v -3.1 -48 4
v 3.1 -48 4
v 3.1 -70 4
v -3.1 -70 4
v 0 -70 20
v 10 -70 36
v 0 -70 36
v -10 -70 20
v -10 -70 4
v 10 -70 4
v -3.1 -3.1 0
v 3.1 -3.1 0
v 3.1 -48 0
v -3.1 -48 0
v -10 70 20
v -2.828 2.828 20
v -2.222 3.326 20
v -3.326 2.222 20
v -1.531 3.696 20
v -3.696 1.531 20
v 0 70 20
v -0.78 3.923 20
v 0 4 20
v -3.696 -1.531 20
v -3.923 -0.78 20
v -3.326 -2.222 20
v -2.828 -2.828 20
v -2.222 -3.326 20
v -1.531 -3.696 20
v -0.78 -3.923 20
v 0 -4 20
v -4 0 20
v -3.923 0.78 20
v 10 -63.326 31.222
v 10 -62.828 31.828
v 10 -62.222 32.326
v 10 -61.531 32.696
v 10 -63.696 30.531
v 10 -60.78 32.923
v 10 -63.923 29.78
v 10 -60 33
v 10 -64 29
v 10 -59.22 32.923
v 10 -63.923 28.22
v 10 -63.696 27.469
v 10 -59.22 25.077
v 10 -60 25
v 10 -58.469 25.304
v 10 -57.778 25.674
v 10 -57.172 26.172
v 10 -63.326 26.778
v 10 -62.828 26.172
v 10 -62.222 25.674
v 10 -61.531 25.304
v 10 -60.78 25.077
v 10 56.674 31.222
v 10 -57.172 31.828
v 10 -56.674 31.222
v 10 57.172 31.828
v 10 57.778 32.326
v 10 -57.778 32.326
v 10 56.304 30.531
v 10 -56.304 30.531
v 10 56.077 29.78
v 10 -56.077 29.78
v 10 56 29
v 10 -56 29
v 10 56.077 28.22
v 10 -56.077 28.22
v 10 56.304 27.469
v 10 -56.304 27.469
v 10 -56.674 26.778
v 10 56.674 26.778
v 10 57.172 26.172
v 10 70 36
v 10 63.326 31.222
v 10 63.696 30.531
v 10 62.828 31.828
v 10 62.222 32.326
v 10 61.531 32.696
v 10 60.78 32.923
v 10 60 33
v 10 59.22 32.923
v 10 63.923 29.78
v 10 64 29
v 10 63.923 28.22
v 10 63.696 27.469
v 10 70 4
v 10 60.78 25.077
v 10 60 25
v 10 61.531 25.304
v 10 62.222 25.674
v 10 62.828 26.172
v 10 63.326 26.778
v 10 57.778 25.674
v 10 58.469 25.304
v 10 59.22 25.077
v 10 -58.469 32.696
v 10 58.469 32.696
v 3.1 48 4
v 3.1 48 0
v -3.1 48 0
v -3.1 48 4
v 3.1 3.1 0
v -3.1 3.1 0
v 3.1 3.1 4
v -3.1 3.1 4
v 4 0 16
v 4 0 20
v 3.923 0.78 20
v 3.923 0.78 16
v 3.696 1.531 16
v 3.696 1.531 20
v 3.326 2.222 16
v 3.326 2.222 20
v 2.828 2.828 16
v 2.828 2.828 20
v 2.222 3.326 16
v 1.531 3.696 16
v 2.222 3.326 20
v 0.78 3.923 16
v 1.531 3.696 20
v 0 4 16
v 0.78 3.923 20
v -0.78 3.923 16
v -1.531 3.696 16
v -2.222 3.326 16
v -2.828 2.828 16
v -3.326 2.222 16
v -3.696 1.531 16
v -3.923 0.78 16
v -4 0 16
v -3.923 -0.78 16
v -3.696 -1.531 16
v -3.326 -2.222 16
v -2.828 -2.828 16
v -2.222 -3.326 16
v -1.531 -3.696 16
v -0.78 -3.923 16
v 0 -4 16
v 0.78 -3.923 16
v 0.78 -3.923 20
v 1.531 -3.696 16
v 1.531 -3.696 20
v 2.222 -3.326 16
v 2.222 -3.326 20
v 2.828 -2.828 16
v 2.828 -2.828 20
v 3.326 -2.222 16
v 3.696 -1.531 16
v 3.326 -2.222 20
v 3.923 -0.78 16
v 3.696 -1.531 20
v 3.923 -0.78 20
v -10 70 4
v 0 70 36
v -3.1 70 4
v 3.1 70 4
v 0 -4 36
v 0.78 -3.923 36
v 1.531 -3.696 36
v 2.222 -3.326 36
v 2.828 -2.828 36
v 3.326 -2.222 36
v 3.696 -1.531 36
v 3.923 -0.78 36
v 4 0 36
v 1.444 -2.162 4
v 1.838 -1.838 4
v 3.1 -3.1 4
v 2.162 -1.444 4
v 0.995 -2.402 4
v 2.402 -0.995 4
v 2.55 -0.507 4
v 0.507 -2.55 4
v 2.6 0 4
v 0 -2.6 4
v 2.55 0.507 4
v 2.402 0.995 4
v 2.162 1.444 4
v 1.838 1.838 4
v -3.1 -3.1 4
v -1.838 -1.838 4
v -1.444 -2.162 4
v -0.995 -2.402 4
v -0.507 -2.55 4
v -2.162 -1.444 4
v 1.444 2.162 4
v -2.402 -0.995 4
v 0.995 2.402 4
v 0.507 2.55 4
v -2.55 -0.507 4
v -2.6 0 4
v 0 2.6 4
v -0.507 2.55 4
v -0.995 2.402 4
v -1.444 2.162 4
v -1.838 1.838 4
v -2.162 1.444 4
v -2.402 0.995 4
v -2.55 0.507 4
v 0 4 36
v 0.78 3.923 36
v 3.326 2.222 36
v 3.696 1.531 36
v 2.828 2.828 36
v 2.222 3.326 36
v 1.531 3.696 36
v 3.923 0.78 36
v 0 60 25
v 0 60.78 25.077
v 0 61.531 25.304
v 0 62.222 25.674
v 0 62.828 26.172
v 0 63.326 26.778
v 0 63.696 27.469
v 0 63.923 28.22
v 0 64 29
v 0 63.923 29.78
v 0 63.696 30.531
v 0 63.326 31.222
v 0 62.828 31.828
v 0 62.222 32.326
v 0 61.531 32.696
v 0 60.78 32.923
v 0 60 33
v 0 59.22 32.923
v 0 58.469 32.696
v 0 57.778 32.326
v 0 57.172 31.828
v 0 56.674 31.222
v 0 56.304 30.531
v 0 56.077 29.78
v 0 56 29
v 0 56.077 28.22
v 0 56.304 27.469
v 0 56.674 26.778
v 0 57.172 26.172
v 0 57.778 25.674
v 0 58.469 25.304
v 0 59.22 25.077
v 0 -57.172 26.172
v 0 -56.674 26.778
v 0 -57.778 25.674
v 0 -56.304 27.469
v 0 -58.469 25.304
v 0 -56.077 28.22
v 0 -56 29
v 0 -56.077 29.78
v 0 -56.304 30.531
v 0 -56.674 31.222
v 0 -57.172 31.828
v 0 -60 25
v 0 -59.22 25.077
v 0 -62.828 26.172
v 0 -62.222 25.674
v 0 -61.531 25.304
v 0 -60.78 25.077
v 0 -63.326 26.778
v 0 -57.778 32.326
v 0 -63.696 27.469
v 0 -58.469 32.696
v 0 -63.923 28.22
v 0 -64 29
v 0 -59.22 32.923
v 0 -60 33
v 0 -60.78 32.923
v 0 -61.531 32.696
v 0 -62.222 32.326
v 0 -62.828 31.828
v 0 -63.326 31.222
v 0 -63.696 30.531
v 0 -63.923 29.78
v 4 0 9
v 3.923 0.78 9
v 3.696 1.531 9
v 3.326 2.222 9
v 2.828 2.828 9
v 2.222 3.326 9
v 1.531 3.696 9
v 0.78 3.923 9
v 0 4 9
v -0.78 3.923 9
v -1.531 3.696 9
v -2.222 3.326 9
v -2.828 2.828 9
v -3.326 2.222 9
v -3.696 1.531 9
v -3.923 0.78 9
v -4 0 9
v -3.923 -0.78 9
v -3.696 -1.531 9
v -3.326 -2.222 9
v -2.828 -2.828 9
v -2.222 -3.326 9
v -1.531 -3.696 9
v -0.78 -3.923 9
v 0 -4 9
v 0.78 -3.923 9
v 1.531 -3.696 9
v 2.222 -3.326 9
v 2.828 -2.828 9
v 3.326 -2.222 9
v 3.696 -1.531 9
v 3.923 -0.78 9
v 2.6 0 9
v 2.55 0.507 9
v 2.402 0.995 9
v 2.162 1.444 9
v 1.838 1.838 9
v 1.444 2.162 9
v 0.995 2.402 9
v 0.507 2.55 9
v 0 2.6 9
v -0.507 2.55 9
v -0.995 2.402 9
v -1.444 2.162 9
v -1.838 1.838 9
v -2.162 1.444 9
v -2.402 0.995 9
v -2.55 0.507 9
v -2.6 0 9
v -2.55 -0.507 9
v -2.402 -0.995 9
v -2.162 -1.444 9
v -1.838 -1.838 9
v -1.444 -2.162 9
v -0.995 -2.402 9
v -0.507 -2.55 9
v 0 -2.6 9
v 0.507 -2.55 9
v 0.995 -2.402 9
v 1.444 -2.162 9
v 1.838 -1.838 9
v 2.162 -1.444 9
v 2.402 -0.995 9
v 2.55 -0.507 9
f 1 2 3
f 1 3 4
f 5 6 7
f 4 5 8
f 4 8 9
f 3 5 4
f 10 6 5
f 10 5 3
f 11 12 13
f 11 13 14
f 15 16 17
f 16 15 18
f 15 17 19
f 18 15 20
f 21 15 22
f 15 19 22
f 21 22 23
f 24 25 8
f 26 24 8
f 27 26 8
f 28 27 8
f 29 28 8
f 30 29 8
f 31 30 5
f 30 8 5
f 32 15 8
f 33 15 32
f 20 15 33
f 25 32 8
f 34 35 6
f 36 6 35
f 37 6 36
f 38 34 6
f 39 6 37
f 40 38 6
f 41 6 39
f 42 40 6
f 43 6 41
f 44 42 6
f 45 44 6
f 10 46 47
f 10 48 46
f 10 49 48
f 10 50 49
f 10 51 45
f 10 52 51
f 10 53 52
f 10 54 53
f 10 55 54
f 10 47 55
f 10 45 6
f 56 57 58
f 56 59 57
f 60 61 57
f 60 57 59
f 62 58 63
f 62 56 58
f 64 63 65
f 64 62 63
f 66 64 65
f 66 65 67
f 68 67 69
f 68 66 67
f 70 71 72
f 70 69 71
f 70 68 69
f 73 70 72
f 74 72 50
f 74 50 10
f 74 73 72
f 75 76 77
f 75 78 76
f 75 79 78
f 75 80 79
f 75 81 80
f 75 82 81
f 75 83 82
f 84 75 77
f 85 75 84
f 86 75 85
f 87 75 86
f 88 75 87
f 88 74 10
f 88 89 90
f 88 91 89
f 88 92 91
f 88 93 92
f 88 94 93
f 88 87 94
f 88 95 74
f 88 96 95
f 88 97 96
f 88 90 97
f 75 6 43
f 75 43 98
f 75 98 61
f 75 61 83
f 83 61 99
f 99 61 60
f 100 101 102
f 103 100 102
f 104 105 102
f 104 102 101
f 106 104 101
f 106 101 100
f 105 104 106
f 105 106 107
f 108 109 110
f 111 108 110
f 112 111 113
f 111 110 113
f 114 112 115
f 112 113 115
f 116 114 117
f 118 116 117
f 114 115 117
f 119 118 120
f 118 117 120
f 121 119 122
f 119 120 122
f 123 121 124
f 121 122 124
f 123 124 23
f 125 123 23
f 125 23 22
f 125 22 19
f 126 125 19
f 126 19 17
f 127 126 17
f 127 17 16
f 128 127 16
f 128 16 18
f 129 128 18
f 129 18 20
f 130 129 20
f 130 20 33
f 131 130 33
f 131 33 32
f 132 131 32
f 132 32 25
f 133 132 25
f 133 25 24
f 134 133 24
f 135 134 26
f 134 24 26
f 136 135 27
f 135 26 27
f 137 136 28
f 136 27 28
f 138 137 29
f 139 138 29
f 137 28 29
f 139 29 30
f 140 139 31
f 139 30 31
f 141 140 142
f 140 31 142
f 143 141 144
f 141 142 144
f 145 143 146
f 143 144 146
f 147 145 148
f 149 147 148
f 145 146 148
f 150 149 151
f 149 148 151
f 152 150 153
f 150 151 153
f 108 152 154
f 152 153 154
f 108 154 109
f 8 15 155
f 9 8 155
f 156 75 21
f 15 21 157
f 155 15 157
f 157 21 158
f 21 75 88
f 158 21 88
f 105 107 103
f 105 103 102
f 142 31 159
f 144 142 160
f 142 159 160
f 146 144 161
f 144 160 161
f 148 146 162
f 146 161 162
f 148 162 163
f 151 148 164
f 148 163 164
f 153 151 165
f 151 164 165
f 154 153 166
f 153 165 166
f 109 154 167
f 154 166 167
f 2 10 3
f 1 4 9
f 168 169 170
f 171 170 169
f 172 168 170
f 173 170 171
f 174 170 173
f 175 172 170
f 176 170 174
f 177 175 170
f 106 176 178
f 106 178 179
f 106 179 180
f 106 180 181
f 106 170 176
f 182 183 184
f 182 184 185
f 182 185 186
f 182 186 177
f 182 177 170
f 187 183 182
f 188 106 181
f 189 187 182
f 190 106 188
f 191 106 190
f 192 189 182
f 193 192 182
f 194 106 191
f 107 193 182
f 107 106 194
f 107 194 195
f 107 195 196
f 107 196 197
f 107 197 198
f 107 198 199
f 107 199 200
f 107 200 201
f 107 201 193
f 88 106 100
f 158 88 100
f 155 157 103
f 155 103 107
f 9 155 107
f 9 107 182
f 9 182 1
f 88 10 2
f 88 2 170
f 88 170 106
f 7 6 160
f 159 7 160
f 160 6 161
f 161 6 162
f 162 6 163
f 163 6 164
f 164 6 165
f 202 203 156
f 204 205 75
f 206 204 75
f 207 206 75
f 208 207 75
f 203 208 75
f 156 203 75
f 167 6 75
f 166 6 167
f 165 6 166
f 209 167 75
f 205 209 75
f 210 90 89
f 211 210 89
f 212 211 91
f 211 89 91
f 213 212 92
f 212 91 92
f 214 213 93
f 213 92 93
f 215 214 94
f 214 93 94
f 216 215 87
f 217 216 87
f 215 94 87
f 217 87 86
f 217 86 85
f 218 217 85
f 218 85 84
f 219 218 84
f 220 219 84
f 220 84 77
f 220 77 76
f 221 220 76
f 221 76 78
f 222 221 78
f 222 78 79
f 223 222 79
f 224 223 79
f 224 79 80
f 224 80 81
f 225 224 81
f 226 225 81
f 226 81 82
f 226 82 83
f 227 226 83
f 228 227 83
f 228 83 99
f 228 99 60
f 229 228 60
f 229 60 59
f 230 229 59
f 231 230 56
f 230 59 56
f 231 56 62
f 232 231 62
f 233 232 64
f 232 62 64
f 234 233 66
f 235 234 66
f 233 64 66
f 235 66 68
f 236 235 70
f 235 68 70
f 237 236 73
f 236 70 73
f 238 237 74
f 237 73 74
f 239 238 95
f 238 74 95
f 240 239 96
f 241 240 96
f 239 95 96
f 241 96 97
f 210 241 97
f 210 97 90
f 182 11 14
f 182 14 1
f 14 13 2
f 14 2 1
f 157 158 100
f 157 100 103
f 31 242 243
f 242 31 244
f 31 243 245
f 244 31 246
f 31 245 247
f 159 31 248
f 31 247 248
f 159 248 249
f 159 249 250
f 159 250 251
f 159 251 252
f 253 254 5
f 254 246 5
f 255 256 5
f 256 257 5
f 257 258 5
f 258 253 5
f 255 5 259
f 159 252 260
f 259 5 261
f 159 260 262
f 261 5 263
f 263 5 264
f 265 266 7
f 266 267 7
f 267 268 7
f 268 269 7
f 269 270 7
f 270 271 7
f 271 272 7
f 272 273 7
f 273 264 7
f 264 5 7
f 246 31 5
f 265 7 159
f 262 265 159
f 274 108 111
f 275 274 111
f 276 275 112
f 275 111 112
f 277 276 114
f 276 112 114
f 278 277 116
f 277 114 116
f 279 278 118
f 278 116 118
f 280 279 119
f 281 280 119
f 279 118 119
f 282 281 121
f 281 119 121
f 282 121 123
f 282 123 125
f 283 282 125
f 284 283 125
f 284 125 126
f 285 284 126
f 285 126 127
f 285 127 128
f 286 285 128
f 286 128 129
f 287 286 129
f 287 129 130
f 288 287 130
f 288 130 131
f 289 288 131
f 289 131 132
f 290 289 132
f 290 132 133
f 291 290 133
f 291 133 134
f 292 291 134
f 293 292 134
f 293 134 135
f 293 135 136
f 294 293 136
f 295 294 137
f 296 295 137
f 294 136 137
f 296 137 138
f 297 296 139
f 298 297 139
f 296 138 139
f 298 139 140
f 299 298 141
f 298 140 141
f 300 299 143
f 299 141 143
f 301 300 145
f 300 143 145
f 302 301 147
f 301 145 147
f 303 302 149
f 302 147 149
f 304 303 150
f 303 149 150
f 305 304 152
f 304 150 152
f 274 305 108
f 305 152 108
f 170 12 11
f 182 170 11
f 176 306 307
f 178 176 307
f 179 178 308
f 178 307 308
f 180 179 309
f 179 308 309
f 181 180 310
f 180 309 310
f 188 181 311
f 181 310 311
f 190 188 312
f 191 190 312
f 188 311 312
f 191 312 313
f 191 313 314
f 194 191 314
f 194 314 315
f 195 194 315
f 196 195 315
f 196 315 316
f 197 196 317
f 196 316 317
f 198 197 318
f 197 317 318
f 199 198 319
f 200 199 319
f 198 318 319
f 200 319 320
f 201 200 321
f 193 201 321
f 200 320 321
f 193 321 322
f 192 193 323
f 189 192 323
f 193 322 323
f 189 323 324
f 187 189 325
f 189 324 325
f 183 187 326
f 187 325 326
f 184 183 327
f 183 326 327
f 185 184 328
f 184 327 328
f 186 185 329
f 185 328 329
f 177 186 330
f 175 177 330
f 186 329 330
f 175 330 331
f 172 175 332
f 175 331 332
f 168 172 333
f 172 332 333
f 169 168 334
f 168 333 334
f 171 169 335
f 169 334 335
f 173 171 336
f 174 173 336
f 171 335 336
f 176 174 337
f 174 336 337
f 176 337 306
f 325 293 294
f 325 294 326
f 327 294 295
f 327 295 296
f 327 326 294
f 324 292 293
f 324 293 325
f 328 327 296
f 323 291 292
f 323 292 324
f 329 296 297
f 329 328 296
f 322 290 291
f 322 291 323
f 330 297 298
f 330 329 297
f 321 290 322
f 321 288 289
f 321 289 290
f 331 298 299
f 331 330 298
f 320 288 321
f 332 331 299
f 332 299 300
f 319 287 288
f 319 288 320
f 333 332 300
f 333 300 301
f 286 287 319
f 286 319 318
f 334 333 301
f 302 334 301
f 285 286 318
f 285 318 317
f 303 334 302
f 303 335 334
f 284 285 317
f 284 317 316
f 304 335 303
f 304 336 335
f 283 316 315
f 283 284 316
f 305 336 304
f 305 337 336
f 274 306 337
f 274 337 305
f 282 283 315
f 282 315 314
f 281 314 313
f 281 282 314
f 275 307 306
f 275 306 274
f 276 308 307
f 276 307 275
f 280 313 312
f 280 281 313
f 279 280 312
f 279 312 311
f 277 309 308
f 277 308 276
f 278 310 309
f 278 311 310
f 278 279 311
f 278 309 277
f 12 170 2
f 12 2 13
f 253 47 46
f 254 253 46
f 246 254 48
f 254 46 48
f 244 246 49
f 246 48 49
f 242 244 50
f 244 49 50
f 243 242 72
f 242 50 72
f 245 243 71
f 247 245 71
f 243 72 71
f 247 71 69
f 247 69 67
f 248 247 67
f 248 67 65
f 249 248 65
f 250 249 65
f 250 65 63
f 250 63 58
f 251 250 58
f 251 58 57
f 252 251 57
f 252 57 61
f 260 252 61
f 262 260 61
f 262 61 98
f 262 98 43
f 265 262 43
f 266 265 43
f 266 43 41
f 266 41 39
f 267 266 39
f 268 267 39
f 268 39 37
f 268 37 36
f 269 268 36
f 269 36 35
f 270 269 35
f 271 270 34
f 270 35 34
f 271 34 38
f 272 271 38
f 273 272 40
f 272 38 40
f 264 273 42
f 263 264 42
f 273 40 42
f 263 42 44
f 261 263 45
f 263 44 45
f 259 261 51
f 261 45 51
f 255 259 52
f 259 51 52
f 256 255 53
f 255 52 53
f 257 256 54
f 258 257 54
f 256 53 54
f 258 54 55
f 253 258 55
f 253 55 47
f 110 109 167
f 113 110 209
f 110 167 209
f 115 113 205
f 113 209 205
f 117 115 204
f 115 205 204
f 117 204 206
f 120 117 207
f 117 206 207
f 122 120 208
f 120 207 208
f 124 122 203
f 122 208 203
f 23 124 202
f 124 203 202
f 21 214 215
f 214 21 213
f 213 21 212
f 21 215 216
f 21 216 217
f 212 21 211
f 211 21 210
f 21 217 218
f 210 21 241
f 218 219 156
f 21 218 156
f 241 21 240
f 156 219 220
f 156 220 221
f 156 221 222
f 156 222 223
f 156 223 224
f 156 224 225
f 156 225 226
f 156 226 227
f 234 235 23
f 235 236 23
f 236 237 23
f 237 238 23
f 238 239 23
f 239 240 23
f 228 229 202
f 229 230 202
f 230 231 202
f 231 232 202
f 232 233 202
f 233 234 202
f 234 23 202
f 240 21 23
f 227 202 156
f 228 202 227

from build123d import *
from build123d.topology import SkipClean

# Parameters (mm, degrees)
EXTRUDE_1_DEPTH      = 14
CUT_EXTRUDE_1_DEPTH  = 44
SKETCH_3_W           = 6.2
SKETCH_3_H           = 6.2
CUT_EXTRUDE_2_DEPTH  = 4
SKETCH_4_R           = 4
CUT_EXTRUDE_3_DEPTH  = 5
SKETCH_5_R           = 2.6
CUT_EXTRUDE_4_DEPTH  = 5
SKETCH_6_W           = 5
SKETCH_6_H           = 44
CUT_EXTRUDE_5_DEPTH  = 10
SKETCH_7_W           = 5
SKETCH_7_H           = 44
CUT_EXTRUDE_6_DEPTH  = 10
EXTRUDE_3_DEPTH      = 48
EXTRUDE_4_DEPTH      = 48
SKETCH_11_W          = 22
SKETCH_11_H          = 140
EXTRUDE_5_DEPTH      = 20
SKETCH_12_R          = 4
CUT_EXTRUDE_7_DEPTH  = 20
SKETCH_13_W          = 10
SKETCH_13_H          = 16
CUT_EXTRUDE_8_DEPTH  = 140
CUT_EXTRUDE_9_DEPTH  = 6
SKETCH_15_R          = 4
CUT_EXTRUDE_10_DEPTH = 20
SKETCH_16_W          = 6.2
SKETCH_16_H          = 22
CUT_EXTRUDE_11_DEPTH = 4


with BuildPart() as part:
    # 草图1 → 凸台-拉伸1 (new body)
    with BuildSketch(Plane.XY):
        Polygon((-15, 22), (-15, -22), (15, -22), (15, 22), (0, 22), align=None)
    extrude(amount=EXTRUDE_1_DEPTH)

    # 草图2 → 切除-拉伸1 (cut)
    with BuildSketch(Plane(origin=(0, 22, 0), x_dir=(1, 0, 0), z_dir=(0, 1, 0))):
        Polygon((-15, 0), (-15, -14), (-10, -4), (-3.1, -4), (-3.1, 0), align=None)
        Polygon((3.1, -4), (10, -4), (15, -14), (15, 0), (3.1, 0), align=None)
    extrude(amount=-CUT_EXTRUDE_1_DEPTH, mode=Mode.SUBTRACT)

    # 草图3 → 切除-拉伸2 (cut)
    with BuildSketch(Plane(origin=(0, 0, 0), x_dir=(-1, 0, 0), z_dir=(0, 0, -1))):
        Rectangle(SKETCH_3_W, SKETCH_3_H)
    extrude(amount=-CUT_EXTRUDE_2_DEPTH, mode=Mode.SUBTRACT)

    # 草图4 → 切除-拉伸3 (cut)
    with BuildSketch(Plane.XY.offset(14)):
        Circle(SKETCH_4_R)
    extrude(amount=-CUT_EXTRUDE_3_DEPTH, mode=Mode.SUBTRACT)

    # 草图5 → 切除-拉伸4 (cut)
    with BuildSketch(Plane.XY.offset(9)):
        Circle(SKETCH_5_R)
    extrude(amount=-CUT_EXTRUDE_4_DEPTH, mode=Mode.SUBTRACT)

    # 草图6 → 切除-拉伸5 (cut)
    with BuildSketch(Plane(origin=(0, 0, 4), x_dir=(-1, 0, 0), z_dir=(0, 0, -1))):
        with Locations((12.5, 0)):
            Rectangle(SKETCH_6_W, SKETCH_6_H)
    extrude(amount=-CUT_EXTRUDE_5_DEPTH, mode=Mode.SUBTRACT)

    # 草图7 → 切除-拉伸6 (cut)
    with BuildSketch(Plane(origin=(0, 0, 4), x_dir=(-1, 0, 0), z_dir=(0, 0, -1))):
        with Locations((-12.5, 0)):
            Rectangle(SKETCH_7_W, SKETCH_7_H)
    extrude(amount=-CUT_EXTRUDE_6_DEPTH, mode=Mode.SUBTRACT)

    # 草图9 → 凸台-拉伸3 (add)
    with BuildSketch(Plane(origin=(0, 22, 0), x_dir=(1, 0, 0), z_dir=(0, 1, 0))):
        Polygon((-3.1, 0), (3.1, 0), (3.1, -4), (10, -4), (10, -14), (-10, -14), (-10, -4), (-3.1, -4), align=None)
    extrude(amount=EXTRUDE_3_DEPTH)

    # 草图10 → 凸台-拉伸4 (add)
    with BuildSketch(Plane(origin=(0, -22, 0), x_dir=(-1, 0, 0), z_dir=(0, -1, 0))):
        Polygon((10, -14), (-10, -14), (-10, -4), (-3.1, -4), (-3.1, 0), (3.1, 0), (3.1, -4), (10, -4), align=None)
    extrude(amount=EXTRUDE_4_DEPTH)

    # 草图11 → 凸台-拉伸5 (add)
    with BuildSketch(Plane(origin=(10, 0, 0), x_dir=(0, 0, -1), z_dir=(1, 0, 0))):
        with Locations((-25, 0)):
            Rectangle(SKETCH_11_W, SKETCH_11_H)
    extrude(amount=-EXTRUDE_5_DEPTH)

    # 草图12 → 切除-拉伸7 (cut)
    with BuildSketch(Plane(origin=(10, 0, 0), x_dir=(0, 0, -1), z_dir=(1, 0, 0))):
        with Locations((-29, 60)):
            Circle(SKETCH_12_R)
        with Locations((-29, -60)):
            Circle(SKETCH_12_R)
    extrude(amount=-CUT_EXTRUDE_7_DEPTH, mode=Mode.SUBTRACT)

    # 草图13 → 切除-拉伸8 (cut)
    with BuildSketch(Plane.XZ.offset(70)):
        with Locations((-5, 28)):
            Rectangle(SKETCH_13_W, SKETCH_13_H)
    extrude(amount=-CUT_EXTRUDE_8_DEPTH, mode=Mode.SUBTRACT)

    # 草图14 → 切除-拉伸9 (cut)
    with BuildSketch(Plane.XY.offset(20)):
        with BuildLine():
            ThreePointArc((4, 0), (2.828427125, 2.828427125), (0, 4))
            Line((0, 4), (0, -4))
            ThreePointArc((0, -4), (2.828427125, -2.828427125), (4, 0))
        make_face()
        with BuildLine():
            Line((0, -4), (0, 4))
            ThreePointArc((0, 4), (-4, 0), (0, -4))
        make_face()
    extrude(amount=-CUT_EXTRUDE_9_DEPTH, mode=Mode.SUBTRACT)

    # 草图15 → 切除-拉伸10 (cut)
    with SkipClean():  # the faces are left unmerged after this step: merging them gives an invalid solid
        with BuildSketch(Plane.XY.offset(36)):
            Circle(SKETCH_15_R)
        extrude(amount=-CUT_EXTRUDE_10_DEPTH, mode=Mode.SUBTRACT)

    # 草图16 → 切除-拉伸11 (cut)
    with SkipClean():  # the faces are left unmerged after this step: merging them gives an invalid solid
        with BuildSketch(Plane(origin=(0, 0, 0), x_dir=(-1, 0, 0), z_dir=(0, 0, -1))):
            with Locations((0, 59)):
                Rectangle(SKETCH_16_W, SKETCH_16_H)
            with Locations((0, -59)):
                Rectangle(SKETCH_16_W, SKETCH_16_H)
        extrude(amount=-CUT_EXTRUDE_11_DEPTH, mode=Mode.SUBTRACT)


solid = part.part
